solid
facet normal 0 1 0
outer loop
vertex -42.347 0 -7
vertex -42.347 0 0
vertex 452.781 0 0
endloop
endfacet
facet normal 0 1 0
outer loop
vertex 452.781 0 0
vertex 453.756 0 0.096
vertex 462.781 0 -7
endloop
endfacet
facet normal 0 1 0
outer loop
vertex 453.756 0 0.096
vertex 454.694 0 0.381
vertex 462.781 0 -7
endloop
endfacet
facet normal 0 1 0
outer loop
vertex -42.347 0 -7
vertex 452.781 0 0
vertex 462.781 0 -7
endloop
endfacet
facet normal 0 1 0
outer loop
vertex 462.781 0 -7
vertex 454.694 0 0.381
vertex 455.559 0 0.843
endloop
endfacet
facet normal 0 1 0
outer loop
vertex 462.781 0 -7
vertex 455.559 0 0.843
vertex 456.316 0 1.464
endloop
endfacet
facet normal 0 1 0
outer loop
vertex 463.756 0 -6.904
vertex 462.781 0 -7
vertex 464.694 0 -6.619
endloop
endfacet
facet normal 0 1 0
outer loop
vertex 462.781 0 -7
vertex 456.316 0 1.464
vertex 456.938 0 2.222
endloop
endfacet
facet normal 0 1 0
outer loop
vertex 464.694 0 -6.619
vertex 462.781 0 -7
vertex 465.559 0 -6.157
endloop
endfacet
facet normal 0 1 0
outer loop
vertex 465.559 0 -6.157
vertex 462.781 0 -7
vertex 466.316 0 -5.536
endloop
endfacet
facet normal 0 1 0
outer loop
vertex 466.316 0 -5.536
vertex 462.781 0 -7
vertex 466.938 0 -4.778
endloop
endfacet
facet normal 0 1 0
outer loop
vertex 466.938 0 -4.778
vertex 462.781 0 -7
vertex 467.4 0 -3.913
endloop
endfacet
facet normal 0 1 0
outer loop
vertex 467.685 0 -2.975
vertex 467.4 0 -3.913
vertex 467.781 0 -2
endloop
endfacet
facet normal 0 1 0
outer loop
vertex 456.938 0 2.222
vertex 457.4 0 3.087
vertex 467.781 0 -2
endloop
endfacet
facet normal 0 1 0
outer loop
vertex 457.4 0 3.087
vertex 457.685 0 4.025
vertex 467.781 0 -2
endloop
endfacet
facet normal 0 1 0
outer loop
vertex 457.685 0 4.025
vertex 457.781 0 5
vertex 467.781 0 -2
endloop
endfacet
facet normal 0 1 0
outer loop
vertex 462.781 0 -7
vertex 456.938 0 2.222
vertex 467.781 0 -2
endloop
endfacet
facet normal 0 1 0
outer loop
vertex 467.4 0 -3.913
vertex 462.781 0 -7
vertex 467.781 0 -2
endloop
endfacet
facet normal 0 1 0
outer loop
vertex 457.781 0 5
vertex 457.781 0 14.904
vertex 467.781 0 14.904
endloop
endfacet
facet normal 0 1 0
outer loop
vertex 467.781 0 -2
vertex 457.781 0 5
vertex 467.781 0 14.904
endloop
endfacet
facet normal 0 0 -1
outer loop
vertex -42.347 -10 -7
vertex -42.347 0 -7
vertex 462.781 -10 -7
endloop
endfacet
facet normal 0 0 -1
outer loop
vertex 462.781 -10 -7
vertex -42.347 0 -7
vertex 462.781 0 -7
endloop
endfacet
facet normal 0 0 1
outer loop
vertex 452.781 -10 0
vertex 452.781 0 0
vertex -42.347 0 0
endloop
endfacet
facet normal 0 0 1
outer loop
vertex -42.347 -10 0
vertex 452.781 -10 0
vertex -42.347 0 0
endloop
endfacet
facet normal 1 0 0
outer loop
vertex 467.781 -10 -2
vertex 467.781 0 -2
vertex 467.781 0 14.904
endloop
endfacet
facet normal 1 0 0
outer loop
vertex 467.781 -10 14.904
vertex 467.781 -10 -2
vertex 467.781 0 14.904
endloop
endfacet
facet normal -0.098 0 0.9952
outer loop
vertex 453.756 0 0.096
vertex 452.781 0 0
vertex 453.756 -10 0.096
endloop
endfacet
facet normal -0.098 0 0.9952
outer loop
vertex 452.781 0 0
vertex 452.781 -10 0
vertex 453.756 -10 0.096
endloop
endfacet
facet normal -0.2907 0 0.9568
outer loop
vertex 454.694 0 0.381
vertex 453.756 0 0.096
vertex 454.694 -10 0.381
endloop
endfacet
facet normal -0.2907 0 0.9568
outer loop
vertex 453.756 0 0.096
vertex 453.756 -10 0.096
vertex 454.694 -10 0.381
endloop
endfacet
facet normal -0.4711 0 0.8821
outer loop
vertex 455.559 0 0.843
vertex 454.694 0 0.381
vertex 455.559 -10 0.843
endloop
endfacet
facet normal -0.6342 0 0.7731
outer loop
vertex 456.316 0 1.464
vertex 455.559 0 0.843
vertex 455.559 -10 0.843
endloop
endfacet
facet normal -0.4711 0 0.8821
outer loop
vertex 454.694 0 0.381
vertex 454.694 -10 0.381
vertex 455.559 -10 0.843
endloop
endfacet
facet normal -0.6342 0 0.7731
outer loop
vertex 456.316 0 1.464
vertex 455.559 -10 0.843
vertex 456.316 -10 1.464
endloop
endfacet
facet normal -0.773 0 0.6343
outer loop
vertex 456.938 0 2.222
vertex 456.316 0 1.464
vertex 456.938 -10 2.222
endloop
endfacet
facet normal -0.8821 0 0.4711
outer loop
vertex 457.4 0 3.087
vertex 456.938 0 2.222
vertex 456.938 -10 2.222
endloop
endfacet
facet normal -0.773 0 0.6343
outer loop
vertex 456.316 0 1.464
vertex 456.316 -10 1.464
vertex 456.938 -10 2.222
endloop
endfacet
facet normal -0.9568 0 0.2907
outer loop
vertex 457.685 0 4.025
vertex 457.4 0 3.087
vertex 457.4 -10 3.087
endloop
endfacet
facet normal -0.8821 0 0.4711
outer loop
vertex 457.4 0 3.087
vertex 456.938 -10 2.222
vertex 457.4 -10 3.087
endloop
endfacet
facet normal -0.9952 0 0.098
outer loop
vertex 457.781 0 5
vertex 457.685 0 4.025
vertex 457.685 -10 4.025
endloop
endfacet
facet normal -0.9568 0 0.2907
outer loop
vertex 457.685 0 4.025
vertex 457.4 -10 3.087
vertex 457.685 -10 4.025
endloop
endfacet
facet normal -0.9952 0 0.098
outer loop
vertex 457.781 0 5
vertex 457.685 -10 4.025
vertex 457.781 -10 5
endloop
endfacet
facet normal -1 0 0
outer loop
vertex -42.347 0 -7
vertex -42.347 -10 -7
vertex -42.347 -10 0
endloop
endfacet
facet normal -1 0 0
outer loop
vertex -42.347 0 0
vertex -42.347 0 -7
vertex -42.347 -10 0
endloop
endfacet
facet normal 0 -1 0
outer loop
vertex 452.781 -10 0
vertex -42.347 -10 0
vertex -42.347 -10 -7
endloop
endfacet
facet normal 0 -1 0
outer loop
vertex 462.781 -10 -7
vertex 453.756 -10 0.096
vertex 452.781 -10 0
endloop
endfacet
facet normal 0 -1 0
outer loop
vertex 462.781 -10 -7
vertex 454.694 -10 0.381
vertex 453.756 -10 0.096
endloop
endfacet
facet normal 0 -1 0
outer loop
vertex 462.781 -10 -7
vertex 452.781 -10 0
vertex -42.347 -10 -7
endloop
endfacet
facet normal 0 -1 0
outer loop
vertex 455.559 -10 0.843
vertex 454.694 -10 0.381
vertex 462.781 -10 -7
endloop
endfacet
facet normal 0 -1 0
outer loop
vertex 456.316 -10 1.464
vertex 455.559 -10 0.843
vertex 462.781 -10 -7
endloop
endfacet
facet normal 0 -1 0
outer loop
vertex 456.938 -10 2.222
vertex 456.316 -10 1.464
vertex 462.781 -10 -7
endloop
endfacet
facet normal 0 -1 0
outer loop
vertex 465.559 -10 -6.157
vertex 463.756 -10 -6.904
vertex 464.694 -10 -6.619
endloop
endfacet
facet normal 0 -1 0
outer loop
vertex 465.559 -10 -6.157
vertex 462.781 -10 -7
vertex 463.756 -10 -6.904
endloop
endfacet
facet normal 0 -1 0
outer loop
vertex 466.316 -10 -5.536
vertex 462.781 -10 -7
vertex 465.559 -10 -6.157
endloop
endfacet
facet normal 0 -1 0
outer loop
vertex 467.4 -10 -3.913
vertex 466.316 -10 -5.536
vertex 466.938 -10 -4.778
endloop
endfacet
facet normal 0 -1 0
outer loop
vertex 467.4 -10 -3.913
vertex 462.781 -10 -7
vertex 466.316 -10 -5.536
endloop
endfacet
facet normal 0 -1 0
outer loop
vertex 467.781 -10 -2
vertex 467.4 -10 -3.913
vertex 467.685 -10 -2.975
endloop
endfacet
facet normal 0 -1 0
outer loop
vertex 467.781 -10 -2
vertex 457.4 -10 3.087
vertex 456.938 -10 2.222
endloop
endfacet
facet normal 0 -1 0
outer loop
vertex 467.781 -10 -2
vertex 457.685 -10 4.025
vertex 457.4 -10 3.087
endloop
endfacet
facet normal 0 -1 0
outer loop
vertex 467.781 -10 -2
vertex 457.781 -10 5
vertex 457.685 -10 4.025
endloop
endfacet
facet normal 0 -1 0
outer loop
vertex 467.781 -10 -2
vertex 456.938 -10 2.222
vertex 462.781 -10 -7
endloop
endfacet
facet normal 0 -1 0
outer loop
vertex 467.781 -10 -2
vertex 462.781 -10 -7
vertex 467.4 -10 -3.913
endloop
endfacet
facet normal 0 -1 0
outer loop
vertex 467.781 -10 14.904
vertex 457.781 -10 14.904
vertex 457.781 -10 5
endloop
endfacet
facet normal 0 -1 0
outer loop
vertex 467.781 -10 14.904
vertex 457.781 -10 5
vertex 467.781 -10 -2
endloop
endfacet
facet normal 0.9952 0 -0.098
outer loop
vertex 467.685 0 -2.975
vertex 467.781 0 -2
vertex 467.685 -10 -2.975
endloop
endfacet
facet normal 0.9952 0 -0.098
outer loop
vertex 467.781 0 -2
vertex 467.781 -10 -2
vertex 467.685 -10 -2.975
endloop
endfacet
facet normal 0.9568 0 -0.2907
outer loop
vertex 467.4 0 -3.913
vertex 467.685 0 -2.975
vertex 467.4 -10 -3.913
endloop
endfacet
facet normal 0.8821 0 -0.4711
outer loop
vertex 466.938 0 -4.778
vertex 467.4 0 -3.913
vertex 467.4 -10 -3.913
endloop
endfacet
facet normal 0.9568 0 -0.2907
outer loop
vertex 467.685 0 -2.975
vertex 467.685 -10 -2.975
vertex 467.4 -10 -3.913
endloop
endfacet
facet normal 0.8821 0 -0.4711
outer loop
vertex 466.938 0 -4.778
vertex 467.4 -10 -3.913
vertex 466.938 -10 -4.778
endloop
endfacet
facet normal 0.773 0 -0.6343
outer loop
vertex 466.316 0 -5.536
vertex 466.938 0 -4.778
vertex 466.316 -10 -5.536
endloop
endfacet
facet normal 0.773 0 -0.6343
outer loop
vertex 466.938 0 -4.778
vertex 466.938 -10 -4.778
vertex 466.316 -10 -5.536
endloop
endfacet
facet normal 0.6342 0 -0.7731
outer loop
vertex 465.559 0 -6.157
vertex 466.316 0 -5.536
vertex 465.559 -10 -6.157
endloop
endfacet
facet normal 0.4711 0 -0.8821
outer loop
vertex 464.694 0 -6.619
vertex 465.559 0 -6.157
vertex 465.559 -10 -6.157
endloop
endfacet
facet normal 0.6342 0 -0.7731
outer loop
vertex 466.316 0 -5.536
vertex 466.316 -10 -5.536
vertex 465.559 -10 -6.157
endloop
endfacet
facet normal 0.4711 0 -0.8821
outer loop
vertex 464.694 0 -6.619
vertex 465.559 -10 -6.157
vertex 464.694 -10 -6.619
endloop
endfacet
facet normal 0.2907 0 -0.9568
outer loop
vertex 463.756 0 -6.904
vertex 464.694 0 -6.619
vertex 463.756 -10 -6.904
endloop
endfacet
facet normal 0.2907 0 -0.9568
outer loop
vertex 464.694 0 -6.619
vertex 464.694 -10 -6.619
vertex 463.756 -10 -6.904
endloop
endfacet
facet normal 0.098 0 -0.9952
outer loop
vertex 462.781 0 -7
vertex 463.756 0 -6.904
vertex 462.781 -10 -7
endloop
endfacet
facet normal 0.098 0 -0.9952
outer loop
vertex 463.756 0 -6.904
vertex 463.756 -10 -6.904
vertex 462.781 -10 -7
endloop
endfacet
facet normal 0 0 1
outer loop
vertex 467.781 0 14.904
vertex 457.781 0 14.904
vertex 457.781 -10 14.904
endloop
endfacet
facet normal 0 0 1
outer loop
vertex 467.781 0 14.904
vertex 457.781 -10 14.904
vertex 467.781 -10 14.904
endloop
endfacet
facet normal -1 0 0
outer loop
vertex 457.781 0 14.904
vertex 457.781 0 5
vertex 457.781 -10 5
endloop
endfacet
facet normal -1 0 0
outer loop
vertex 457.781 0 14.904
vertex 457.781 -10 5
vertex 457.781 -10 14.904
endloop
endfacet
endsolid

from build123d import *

# Parameters (mm, degrees)
F0_W     = 7.2222218177
F0_H     = 63.1481452084
F1_DEPTH = 25
F0_W_2   = 10
F0_H_2   = 10
F0_W_3   = 24.2652441375
F0_H_3   = 6.617795676
F3_W     = 10
F3_H     = 14.9043388665
F4_DEPTH = 10
F5_R     = 5
F6_DEPTH = 25


with BuildPart() as f1:
    # F0 (on Front) → F1 (new body)
    with BuildSketch(Plane.XZ):
        with Locations((-45.9582116171, 0.8881576359)):
            Rectangle(F0_W, F0_H)
    extrude(amount=F1_DEPTH)

    # F3 (on Front) → F4 (join)
    with BuildSketch(Plane.XZ):
        Polygon((457.7808880806, 0), (-47.8088715536, 0), (-47.8088715536, -7), (467.7808880806, -7), (467.7808880806, 0), align=None)
        with Locations((462.7808880806, 7.4521694332)):
            Rectangle(F3_W, F3_H)
    extrude(amount=F4_DEPTH)

    # F5
    f5_edges = [f1.edges().sort_by_distance(p)[0] for p in [
        (457.780888, -5, 0),
        (467.780888, -5, -7),
    ]]
    fillet(f5_edges, radius=F5_R)

    # F6 (cut): a face of the model
    f6_faces = [f1.faces().sort_by_distance(p)[0] for p in [
        (-45.9582116171, -25, 0.8881576359),
    ]]
    extrude(f6_faces, amount=-F6_DEPTH, mode=Mode.SUBTRACT)


with BuildPart() as f1b:
    # F0 (on Front) → F1, piece 2 (new body)
    with BuildSketch(Plane.XZ):
        with Locations((462.6528992917, 20.9807503391)):
            Rectangle(F0_W_2, F0_H_2)
    extrude(amount=F1_DEPTH)


with BuildPart() as f1c:
    # F0 (on Front) → F1, piece 3 (new body)
    with BuildSketch(Plane.XZ):
        with Locations((19.7482968215, 31.2228444964)):
            Rectangle(F0_W_3, F0_H_3)
    extrude(amount=F1_DEPTH)


solid = f1.part
